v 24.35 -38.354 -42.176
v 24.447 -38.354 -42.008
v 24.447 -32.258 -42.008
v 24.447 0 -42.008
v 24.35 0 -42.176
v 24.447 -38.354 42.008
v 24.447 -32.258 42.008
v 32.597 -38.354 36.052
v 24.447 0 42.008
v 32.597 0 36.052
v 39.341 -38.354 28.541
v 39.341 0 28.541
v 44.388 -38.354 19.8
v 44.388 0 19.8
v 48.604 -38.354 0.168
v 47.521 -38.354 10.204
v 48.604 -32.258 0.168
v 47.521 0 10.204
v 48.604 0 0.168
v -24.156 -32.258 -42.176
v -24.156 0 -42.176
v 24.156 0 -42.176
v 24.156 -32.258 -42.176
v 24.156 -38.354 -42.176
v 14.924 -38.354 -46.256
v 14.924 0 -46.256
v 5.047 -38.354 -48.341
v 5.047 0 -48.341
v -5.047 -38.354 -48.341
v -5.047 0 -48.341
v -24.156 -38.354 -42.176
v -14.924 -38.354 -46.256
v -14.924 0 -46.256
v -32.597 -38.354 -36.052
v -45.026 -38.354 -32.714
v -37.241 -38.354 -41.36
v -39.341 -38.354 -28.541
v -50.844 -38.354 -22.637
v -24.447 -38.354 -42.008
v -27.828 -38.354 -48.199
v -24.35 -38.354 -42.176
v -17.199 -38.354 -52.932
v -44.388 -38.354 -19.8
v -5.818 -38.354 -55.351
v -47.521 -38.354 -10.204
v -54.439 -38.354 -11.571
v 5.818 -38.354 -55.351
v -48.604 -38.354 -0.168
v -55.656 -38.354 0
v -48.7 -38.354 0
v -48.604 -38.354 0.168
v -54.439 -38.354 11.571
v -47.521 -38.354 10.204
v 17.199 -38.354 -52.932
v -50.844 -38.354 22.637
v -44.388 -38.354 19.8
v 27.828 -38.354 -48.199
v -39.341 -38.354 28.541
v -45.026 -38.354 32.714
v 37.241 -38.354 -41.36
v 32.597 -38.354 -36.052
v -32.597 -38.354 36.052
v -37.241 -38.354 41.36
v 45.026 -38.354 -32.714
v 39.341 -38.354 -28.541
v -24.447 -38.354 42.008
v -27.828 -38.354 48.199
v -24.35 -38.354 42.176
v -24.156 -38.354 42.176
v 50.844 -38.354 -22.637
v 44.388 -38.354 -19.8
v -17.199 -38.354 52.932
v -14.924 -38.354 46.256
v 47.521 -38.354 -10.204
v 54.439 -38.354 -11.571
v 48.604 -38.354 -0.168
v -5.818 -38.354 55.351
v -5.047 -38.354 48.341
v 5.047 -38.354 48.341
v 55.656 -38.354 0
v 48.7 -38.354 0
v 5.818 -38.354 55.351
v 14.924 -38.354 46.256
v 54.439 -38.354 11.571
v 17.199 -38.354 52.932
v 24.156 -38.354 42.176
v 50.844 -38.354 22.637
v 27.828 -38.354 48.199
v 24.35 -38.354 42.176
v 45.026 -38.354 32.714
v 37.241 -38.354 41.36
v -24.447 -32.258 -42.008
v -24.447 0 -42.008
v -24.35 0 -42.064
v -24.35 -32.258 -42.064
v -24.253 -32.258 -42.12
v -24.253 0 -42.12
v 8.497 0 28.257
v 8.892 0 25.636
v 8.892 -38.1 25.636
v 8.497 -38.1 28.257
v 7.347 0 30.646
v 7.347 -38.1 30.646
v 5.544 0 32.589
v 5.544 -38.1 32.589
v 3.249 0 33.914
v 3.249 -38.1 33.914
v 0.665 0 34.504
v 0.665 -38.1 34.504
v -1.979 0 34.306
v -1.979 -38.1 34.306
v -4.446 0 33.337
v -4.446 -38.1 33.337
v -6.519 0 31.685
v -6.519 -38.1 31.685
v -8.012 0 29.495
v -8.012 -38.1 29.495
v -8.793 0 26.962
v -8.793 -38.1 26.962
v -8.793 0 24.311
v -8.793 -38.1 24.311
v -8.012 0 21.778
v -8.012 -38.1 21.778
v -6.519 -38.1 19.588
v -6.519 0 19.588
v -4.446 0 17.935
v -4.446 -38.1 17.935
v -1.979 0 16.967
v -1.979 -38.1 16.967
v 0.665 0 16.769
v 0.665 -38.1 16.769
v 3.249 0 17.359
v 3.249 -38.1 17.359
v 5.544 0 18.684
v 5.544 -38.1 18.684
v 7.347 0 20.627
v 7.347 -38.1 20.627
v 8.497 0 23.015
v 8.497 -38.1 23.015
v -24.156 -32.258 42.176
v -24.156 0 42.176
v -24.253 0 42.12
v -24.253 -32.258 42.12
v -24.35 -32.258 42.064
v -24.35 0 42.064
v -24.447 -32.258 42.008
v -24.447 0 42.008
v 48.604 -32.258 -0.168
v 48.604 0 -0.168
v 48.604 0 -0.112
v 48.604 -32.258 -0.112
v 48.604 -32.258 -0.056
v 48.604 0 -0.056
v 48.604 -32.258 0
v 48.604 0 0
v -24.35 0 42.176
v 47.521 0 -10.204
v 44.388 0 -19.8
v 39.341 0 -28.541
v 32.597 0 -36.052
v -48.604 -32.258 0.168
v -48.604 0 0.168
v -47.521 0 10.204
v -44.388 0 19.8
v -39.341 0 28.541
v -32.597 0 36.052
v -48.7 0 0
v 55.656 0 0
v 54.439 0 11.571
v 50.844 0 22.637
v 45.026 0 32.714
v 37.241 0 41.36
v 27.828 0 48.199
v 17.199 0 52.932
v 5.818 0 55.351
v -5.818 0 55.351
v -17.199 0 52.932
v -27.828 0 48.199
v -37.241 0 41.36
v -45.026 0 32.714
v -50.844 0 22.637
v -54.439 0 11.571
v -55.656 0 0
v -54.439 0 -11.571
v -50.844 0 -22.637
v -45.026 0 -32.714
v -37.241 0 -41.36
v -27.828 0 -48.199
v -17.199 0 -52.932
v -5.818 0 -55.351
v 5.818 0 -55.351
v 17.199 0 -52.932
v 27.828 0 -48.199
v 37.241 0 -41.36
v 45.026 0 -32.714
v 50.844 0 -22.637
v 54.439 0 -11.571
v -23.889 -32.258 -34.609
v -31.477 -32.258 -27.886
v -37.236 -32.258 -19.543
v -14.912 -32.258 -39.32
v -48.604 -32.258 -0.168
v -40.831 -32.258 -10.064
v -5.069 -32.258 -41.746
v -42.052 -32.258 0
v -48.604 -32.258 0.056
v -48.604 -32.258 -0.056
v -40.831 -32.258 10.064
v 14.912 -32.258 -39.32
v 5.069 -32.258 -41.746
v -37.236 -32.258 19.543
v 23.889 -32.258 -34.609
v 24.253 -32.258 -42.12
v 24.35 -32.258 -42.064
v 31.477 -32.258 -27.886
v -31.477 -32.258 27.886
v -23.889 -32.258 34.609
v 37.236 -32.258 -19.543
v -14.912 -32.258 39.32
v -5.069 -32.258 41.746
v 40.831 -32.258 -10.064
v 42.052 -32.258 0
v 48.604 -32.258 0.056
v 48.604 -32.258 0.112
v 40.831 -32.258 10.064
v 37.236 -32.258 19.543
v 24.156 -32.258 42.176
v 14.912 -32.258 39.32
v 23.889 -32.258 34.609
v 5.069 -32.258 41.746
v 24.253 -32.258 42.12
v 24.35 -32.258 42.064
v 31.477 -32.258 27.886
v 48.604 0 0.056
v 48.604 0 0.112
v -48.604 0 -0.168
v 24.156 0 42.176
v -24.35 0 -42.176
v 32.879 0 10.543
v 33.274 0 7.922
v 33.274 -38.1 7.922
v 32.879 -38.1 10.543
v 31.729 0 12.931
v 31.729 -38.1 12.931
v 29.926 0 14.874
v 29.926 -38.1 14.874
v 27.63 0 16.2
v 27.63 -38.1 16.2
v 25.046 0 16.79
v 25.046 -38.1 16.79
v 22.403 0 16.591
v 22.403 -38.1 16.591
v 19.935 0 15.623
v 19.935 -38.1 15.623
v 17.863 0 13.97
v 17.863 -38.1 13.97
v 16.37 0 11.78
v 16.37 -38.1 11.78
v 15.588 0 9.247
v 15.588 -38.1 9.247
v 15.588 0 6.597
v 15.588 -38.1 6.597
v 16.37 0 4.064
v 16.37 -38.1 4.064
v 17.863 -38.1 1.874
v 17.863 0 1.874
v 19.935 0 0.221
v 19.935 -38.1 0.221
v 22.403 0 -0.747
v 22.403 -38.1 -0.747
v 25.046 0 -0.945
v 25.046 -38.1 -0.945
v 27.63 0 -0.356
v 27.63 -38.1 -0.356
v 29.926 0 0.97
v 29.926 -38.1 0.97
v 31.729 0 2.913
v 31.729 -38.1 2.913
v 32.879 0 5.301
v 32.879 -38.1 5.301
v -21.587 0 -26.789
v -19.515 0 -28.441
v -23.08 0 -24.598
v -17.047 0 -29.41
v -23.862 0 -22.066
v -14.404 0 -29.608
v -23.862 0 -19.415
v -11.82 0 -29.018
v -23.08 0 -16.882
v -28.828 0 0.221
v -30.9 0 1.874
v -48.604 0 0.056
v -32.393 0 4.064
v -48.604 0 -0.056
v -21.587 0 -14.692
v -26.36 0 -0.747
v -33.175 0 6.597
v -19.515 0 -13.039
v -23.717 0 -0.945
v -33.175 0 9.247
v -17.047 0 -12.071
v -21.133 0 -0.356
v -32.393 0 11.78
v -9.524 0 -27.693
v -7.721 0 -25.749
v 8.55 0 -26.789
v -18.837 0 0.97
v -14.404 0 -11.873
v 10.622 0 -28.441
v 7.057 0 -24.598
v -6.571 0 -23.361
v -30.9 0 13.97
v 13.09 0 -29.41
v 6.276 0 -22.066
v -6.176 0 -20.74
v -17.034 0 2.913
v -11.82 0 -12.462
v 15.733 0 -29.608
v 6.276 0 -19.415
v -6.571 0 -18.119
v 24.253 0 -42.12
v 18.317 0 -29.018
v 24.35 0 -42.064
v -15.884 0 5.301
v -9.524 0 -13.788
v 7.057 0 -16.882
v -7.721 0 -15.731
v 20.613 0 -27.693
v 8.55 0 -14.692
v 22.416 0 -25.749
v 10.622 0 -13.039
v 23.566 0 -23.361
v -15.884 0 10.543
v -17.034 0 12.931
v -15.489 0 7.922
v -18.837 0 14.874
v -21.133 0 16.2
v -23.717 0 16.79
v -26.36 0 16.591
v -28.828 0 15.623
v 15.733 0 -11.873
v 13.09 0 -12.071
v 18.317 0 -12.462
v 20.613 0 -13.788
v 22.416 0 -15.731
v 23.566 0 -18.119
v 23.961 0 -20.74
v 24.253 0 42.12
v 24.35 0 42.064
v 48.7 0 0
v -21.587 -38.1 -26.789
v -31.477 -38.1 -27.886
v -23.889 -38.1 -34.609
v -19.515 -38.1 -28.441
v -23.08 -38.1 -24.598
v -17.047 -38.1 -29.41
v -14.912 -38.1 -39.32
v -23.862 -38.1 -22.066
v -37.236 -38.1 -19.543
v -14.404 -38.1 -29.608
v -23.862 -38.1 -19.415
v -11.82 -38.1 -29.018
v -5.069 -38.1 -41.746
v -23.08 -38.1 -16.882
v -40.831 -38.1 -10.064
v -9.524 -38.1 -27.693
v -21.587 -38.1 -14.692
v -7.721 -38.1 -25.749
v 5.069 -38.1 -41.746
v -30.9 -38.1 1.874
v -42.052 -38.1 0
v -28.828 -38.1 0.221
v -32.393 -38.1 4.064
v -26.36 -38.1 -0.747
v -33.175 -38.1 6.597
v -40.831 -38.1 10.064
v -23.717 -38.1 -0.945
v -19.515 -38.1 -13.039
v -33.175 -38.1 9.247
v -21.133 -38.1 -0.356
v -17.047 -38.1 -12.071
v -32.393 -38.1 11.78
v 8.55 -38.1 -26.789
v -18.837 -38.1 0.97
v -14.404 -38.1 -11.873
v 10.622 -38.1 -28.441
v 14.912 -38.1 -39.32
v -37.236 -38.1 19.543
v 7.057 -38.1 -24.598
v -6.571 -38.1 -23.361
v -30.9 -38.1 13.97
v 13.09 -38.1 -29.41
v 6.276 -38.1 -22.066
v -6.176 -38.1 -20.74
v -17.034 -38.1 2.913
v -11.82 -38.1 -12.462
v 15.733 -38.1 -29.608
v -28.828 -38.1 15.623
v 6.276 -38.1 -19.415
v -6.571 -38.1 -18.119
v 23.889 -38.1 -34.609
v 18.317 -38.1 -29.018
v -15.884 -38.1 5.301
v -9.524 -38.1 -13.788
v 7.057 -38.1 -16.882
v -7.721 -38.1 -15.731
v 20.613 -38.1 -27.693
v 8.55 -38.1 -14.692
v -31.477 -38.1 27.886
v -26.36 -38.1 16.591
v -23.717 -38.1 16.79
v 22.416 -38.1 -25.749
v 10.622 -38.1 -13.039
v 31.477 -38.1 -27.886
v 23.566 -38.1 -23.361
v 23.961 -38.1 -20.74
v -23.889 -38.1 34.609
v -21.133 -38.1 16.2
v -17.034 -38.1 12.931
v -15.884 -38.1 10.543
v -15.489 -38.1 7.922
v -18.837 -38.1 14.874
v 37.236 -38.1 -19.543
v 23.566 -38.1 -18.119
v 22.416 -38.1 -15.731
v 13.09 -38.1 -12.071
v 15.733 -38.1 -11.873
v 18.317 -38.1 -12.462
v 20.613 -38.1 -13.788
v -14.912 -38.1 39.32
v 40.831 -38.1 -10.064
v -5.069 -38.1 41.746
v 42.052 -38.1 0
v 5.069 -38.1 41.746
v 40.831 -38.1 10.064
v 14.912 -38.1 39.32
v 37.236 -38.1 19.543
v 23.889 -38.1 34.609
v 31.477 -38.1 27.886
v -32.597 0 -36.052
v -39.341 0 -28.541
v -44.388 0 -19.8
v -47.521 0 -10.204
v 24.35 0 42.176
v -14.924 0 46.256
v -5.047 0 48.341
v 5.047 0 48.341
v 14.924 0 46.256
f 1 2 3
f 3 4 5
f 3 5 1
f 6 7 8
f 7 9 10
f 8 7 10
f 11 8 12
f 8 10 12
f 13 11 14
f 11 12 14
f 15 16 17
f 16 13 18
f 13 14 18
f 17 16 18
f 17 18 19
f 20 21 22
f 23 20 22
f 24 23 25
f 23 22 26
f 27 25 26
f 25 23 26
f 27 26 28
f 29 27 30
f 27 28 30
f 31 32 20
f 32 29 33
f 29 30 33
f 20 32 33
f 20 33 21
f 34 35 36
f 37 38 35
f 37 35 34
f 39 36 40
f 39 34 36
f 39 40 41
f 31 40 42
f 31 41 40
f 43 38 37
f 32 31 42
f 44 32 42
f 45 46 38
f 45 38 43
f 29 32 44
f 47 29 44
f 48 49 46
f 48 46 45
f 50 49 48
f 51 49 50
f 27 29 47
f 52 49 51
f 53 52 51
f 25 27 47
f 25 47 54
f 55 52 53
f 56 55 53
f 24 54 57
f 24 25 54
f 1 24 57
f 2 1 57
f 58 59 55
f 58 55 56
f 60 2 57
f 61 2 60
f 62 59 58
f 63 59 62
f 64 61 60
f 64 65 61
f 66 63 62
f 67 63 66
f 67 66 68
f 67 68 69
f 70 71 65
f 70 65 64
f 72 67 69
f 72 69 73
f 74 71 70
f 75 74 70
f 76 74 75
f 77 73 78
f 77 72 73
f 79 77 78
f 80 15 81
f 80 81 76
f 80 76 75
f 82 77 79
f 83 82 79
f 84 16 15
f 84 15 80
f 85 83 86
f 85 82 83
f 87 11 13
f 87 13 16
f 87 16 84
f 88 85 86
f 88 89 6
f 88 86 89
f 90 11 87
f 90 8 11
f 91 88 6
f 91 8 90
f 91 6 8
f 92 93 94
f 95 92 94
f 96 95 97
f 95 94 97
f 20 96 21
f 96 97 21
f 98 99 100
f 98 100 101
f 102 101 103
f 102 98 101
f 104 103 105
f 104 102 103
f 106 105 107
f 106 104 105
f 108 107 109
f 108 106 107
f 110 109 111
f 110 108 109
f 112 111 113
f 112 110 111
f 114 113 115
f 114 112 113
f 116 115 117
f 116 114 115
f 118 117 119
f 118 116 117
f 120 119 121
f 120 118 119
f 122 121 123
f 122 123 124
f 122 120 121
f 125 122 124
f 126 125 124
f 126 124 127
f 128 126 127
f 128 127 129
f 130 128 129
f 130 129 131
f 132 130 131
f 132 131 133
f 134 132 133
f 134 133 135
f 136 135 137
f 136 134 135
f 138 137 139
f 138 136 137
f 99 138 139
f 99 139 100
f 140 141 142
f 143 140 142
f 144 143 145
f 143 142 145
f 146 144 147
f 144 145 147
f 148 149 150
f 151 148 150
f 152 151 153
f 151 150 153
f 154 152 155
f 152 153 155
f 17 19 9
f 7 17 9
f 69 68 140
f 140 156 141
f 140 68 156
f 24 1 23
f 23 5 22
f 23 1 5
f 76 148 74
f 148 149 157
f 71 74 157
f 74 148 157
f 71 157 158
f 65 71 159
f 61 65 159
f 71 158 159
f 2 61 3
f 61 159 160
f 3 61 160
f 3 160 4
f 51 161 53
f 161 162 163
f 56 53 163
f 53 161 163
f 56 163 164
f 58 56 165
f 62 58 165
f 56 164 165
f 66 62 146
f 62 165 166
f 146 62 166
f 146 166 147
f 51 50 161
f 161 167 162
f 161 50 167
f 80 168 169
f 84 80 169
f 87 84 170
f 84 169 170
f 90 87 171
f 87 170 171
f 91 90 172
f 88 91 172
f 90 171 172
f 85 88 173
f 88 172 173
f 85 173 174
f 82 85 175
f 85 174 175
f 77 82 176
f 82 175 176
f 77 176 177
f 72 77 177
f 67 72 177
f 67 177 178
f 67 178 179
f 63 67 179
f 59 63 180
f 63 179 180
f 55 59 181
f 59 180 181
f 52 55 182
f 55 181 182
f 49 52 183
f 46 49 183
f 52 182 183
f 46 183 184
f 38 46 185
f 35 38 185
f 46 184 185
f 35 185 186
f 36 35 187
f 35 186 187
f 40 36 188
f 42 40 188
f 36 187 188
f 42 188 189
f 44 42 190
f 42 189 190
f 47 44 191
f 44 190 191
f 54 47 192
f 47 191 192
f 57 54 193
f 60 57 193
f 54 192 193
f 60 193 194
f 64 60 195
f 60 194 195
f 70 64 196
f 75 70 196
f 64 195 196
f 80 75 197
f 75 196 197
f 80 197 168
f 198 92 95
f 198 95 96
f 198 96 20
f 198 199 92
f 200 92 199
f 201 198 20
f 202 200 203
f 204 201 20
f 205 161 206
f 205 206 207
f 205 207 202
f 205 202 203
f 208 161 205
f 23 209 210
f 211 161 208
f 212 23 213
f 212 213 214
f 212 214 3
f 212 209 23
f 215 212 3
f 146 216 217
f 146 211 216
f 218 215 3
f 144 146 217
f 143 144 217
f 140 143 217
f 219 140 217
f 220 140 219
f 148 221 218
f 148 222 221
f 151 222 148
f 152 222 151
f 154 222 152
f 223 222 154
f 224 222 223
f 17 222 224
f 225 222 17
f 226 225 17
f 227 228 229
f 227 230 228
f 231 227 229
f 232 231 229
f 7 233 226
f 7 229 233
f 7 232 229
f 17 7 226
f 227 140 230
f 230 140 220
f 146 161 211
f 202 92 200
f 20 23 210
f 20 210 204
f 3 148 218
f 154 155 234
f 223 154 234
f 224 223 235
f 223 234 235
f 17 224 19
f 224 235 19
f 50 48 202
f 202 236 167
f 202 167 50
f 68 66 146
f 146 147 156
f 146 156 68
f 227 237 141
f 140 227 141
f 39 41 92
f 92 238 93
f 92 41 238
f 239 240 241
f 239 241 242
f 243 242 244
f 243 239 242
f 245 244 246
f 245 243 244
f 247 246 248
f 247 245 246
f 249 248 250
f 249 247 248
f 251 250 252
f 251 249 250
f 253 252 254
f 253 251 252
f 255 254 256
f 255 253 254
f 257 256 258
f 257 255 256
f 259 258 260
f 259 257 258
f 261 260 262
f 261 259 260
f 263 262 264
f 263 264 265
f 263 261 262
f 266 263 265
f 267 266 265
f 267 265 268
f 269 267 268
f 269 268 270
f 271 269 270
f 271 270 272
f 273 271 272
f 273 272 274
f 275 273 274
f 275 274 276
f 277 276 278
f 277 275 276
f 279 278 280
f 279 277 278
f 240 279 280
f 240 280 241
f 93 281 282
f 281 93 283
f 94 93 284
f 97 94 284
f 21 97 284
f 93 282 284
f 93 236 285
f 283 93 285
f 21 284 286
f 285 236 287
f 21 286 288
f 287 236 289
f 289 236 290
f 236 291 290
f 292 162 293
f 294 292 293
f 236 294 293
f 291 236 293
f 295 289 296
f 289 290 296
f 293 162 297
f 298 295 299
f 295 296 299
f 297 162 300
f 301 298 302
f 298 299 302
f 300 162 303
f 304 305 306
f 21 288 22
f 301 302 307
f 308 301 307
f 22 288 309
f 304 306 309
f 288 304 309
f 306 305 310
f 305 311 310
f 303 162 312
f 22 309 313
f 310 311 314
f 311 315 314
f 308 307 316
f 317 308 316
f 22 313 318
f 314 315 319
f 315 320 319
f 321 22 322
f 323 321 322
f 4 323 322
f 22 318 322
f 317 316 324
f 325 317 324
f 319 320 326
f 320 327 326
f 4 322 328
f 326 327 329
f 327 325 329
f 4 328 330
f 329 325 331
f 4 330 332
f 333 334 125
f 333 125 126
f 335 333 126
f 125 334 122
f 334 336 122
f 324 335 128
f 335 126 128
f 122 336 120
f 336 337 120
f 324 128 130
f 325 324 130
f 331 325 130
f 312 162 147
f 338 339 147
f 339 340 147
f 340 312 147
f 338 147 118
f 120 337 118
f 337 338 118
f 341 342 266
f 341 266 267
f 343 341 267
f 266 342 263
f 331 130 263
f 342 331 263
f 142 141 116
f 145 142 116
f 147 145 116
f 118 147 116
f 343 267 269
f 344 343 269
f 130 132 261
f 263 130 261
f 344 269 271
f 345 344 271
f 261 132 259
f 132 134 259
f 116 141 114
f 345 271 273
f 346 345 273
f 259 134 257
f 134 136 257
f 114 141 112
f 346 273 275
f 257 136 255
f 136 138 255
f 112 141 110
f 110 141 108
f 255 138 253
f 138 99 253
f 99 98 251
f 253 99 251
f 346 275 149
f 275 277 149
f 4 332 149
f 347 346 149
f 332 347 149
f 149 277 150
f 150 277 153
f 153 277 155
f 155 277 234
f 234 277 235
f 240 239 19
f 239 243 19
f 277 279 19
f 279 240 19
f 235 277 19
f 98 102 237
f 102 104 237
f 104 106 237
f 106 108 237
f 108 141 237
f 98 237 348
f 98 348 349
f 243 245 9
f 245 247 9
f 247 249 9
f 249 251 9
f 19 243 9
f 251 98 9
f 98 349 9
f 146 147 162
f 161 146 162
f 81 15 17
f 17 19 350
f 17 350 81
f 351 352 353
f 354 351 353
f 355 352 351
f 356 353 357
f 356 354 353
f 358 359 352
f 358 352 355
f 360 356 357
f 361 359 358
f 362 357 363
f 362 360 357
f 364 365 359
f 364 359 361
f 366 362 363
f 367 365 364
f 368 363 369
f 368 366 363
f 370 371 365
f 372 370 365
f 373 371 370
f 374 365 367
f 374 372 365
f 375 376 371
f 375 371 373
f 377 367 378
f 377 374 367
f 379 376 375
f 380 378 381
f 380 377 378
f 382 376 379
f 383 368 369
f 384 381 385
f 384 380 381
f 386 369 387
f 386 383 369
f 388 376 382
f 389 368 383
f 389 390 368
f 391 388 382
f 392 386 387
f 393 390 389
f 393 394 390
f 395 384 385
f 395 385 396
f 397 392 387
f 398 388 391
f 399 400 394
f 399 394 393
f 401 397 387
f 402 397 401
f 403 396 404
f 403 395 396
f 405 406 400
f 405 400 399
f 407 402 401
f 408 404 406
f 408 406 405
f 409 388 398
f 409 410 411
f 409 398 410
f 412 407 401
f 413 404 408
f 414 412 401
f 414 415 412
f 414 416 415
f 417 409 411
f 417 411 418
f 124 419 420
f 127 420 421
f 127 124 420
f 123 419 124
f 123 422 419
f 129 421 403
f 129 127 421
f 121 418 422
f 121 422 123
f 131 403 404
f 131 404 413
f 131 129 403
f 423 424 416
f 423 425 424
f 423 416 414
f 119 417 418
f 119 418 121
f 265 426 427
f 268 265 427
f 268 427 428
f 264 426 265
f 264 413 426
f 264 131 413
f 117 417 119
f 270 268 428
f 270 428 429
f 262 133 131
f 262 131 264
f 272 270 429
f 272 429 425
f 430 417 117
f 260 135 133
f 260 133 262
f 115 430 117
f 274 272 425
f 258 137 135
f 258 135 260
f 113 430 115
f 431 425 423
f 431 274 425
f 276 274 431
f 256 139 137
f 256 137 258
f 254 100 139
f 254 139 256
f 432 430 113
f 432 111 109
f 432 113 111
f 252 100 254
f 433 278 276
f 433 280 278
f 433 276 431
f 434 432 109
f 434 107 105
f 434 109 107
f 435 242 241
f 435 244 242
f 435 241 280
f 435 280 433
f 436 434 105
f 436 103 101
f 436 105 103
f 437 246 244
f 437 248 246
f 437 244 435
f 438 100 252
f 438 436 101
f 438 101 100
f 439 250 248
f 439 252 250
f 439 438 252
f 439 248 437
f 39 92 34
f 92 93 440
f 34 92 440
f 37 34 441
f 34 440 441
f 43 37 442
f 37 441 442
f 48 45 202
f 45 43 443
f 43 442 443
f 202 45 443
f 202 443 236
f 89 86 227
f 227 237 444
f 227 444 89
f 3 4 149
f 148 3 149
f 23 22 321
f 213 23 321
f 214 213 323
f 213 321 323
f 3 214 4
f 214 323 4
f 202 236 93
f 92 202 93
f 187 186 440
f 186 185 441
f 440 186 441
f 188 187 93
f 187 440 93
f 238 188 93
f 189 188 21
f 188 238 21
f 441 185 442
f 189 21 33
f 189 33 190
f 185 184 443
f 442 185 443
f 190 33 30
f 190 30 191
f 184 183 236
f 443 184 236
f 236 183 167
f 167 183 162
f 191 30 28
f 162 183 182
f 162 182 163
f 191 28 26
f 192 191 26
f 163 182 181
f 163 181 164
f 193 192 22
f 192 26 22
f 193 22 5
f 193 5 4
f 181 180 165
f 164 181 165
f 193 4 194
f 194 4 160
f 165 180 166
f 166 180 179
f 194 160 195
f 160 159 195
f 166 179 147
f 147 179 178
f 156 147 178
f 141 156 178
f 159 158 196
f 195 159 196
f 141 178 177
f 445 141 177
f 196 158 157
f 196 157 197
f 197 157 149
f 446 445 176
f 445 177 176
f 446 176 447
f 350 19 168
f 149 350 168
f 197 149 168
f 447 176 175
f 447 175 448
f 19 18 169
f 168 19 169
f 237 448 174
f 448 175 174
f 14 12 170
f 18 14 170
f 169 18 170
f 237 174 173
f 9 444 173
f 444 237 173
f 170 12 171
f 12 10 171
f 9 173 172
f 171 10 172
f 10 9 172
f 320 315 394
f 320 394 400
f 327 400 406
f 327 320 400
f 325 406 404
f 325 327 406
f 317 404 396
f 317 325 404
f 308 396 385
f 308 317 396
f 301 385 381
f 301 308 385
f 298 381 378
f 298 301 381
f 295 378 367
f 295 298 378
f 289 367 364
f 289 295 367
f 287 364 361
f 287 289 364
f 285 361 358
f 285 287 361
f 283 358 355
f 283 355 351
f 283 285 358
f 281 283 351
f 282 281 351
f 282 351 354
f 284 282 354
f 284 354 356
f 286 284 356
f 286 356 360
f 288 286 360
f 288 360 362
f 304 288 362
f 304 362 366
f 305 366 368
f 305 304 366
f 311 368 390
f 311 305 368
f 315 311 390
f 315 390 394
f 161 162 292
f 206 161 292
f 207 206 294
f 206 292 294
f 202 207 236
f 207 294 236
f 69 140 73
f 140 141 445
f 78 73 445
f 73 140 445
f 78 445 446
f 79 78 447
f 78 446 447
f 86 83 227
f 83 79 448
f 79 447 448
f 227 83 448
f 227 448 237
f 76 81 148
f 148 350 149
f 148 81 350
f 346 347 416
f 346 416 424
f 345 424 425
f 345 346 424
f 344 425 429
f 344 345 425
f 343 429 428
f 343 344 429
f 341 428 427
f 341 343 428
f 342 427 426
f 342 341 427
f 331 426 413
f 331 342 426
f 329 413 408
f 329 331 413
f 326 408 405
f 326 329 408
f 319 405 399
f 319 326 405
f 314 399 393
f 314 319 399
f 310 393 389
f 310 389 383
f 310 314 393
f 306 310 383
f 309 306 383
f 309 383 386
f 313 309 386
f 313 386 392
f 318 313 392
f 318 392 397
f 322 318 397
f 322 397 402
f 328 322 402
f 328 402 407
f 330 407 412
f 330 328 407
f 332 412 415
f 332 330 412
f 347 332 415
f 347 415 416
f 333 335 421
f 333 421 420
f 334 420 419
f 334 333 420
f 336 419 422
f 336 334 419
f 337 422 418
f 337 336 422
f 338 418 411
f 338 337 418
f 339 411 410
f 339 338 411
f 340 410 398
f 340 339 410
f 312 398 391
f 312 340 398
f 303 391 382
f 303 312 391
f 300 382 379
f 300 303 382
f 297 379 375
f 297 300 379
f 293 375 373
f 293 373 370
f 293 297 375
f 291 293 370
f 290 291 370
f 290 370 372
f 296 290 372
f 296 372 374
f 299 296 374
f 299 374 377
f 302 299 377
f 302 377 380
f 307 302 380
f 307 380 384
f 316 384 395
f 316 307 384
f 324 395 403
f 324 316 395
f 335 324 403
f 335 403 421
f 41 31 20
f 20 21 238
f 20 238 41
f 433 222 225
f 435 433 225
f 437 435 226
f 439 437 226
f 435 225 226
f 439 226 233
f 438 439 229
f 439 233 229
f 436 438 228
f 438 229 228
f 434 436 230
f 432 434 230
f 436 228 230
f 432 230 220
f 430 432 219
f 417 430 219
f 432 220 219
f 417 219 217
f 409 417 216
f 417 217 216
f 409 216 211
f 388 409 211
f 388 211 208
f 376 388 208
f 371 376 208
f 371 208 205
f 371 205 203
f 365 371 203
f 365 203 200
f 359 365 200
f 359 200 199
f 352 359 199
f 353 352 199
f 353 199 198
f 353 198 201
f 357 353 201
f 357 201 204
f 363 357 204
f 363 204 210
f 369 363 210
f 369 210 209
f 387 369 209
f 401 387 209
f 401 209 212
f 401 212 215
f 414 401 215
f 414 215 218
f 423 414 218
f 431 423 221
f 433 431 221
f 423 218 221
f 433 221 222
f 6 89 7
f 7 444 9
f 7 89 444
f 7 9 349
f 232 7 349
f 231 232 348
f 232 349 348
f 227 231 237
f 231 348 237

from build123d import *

# Parameters (mm, degrees)
F0_R     = 55.655673
F1_DEPTH = 38.354
F0_R_2   = 42.052498
F0_R_3   = 8.892403
F2_DEPTH = 38.1
F3_DEPTH = 32.258


with BuildPart() as f1:
    # F0 (on Front) → F1 (new body)
    with BuildSketch(Plane.XZ):
        Circle(F0_R)
        with BuildLine():
            ThreePointArc((24.44715, 42.007923), (42.09212, 24.301897), (48.603504, 0.167891))
            Line((48.603504, 0.167891), (48.700436, 0))
            Line((48.700436, 0), (48.603504, -0.167891))
            ThreePointArc((48.603504, -0.167891), (42.09212, -24.301897), (24.44715, -42.007923))
            Line((24.44715, -42.007923), (24.350218, -42.175815))
            Line((24.350218, -42.175815), (24.156354, -42.175815))
            ThreePointArc((24.156354, -42.175815), (0, -48.603794), (-24.156354, -42.175815))
            Line((-24.156354, -42.175815), (-24.350218, -42.175815))
            Line((-24.350218, -42.175815), (-24.44715, -42.007923))
            ThreePointArc((-24.44715, -42.007923), (-42.09212, -24.301897), (-48.603504, -0.167891))
            Line((-48.603504, -0.167891), (-48.700436, 0))
            Line((-48.700436, 0), (-48.603504, 0.167891))
            ThreePointArc((-48.603504, 0.167891), (-42.09212, 24.301897), (-24.44715, 42.007923))
            Line((-24.44715, 42.007923), (-24.350218, 42.175815))
            Line((-24.350218, 42.175815), (-24.156354, 42.175815))
            ThreePointArc((-24.156354, 42.175815), (0, 48.603794), (24.156354, 42.175815))
            Line((24.156354, 42.175815), (24.350218, 42.175815))
            Line((24.350218, 42.175815), (24.44715, 42.007923))
        make_face(mode=Mode.SUBTRACT)
    extrude(amount=F1_DEPTH)



with BuildPart() as f2:
    # F0 (on Front) → F2 (new body)
    with BuildSketch(Plane.XZ):
        Circle(F0_R_2)
        with Locations((-15.068627, -20.740186)):
            Circle(F0_R_3, mode=Mode.SUBTRACT)
        with Locations((15.068627, -20.740186)):
            Circle(F0_R_3, mode=Mode.SUBTRACT)
        with Locations((-24.381551, 7.922046)):
            Circle(F0_R_3, mode=Mode.SUBTRACT)
        with Locations((24.381551, 7.922046)):
            Circle(F0_R_3, mode=Mode.SUBTRACT)
        with Locations((0, 25.63628)):
            Circle(F0_R_3, mode=Mode.SUBTRACT)
    extrude(amount=F2_DEPTH)


with BuildPart() as f1_1:
    add(f1.part)

    add(f2.part)  # F3 merges F2
    # F0 (on Front) → F3 (join)
    with BuildSketch(Plane.XZ):
        with BuildLine():
            ThreePointArc((48.603504, -0.167891), (48.603721, -0.083946), (48.603794, 0))
            ThreePointArc((48.603794, 0), (48.603721, 0.083946), (48.603504, 0.167891))
            Line((48.603504, 0.167891), (24.44715, 42.007923))
            ThreePointArc((24.44715, 42.007923), (24.301897, 42.09212), (24.156354, 42.175815))
            Line((24.156354, 42.175815), (-24.156354, 42.175815))
            ThreePointArc((-24.156354, 42.175815), (-24.301897, 42.09212), (-24.44715, 42.007923))
            Line((-24.44715, 42.007923), (-48.603504, 0.167891))
            ThreePointArc((-48.603504, 0.167891), (-48.603794, 0), (-48.603504, -0.167891))
            Line((-48.603504, -0.167891), (-24.44715, -42.007923))
            ThreePointArc((-24.44715, -42.007923), (-24.301897, -42.09212), (-24.156354, -42.175815))
            Line((-24.156354, -42.175815), (24.156354, -42.175815))
            ThreePointArc((24.156354, -42.175815), (24.301897, -42.09212), (24.44715, -42.007923))
            Line((24.44715, -42.007923), (48.603504, -0.167891))
        make_face()
        Circle(F0_R_2, mode=Mode.SUBTRACT)
    extrude(amount=F3_DEPTH)


solid = f1_1.part
